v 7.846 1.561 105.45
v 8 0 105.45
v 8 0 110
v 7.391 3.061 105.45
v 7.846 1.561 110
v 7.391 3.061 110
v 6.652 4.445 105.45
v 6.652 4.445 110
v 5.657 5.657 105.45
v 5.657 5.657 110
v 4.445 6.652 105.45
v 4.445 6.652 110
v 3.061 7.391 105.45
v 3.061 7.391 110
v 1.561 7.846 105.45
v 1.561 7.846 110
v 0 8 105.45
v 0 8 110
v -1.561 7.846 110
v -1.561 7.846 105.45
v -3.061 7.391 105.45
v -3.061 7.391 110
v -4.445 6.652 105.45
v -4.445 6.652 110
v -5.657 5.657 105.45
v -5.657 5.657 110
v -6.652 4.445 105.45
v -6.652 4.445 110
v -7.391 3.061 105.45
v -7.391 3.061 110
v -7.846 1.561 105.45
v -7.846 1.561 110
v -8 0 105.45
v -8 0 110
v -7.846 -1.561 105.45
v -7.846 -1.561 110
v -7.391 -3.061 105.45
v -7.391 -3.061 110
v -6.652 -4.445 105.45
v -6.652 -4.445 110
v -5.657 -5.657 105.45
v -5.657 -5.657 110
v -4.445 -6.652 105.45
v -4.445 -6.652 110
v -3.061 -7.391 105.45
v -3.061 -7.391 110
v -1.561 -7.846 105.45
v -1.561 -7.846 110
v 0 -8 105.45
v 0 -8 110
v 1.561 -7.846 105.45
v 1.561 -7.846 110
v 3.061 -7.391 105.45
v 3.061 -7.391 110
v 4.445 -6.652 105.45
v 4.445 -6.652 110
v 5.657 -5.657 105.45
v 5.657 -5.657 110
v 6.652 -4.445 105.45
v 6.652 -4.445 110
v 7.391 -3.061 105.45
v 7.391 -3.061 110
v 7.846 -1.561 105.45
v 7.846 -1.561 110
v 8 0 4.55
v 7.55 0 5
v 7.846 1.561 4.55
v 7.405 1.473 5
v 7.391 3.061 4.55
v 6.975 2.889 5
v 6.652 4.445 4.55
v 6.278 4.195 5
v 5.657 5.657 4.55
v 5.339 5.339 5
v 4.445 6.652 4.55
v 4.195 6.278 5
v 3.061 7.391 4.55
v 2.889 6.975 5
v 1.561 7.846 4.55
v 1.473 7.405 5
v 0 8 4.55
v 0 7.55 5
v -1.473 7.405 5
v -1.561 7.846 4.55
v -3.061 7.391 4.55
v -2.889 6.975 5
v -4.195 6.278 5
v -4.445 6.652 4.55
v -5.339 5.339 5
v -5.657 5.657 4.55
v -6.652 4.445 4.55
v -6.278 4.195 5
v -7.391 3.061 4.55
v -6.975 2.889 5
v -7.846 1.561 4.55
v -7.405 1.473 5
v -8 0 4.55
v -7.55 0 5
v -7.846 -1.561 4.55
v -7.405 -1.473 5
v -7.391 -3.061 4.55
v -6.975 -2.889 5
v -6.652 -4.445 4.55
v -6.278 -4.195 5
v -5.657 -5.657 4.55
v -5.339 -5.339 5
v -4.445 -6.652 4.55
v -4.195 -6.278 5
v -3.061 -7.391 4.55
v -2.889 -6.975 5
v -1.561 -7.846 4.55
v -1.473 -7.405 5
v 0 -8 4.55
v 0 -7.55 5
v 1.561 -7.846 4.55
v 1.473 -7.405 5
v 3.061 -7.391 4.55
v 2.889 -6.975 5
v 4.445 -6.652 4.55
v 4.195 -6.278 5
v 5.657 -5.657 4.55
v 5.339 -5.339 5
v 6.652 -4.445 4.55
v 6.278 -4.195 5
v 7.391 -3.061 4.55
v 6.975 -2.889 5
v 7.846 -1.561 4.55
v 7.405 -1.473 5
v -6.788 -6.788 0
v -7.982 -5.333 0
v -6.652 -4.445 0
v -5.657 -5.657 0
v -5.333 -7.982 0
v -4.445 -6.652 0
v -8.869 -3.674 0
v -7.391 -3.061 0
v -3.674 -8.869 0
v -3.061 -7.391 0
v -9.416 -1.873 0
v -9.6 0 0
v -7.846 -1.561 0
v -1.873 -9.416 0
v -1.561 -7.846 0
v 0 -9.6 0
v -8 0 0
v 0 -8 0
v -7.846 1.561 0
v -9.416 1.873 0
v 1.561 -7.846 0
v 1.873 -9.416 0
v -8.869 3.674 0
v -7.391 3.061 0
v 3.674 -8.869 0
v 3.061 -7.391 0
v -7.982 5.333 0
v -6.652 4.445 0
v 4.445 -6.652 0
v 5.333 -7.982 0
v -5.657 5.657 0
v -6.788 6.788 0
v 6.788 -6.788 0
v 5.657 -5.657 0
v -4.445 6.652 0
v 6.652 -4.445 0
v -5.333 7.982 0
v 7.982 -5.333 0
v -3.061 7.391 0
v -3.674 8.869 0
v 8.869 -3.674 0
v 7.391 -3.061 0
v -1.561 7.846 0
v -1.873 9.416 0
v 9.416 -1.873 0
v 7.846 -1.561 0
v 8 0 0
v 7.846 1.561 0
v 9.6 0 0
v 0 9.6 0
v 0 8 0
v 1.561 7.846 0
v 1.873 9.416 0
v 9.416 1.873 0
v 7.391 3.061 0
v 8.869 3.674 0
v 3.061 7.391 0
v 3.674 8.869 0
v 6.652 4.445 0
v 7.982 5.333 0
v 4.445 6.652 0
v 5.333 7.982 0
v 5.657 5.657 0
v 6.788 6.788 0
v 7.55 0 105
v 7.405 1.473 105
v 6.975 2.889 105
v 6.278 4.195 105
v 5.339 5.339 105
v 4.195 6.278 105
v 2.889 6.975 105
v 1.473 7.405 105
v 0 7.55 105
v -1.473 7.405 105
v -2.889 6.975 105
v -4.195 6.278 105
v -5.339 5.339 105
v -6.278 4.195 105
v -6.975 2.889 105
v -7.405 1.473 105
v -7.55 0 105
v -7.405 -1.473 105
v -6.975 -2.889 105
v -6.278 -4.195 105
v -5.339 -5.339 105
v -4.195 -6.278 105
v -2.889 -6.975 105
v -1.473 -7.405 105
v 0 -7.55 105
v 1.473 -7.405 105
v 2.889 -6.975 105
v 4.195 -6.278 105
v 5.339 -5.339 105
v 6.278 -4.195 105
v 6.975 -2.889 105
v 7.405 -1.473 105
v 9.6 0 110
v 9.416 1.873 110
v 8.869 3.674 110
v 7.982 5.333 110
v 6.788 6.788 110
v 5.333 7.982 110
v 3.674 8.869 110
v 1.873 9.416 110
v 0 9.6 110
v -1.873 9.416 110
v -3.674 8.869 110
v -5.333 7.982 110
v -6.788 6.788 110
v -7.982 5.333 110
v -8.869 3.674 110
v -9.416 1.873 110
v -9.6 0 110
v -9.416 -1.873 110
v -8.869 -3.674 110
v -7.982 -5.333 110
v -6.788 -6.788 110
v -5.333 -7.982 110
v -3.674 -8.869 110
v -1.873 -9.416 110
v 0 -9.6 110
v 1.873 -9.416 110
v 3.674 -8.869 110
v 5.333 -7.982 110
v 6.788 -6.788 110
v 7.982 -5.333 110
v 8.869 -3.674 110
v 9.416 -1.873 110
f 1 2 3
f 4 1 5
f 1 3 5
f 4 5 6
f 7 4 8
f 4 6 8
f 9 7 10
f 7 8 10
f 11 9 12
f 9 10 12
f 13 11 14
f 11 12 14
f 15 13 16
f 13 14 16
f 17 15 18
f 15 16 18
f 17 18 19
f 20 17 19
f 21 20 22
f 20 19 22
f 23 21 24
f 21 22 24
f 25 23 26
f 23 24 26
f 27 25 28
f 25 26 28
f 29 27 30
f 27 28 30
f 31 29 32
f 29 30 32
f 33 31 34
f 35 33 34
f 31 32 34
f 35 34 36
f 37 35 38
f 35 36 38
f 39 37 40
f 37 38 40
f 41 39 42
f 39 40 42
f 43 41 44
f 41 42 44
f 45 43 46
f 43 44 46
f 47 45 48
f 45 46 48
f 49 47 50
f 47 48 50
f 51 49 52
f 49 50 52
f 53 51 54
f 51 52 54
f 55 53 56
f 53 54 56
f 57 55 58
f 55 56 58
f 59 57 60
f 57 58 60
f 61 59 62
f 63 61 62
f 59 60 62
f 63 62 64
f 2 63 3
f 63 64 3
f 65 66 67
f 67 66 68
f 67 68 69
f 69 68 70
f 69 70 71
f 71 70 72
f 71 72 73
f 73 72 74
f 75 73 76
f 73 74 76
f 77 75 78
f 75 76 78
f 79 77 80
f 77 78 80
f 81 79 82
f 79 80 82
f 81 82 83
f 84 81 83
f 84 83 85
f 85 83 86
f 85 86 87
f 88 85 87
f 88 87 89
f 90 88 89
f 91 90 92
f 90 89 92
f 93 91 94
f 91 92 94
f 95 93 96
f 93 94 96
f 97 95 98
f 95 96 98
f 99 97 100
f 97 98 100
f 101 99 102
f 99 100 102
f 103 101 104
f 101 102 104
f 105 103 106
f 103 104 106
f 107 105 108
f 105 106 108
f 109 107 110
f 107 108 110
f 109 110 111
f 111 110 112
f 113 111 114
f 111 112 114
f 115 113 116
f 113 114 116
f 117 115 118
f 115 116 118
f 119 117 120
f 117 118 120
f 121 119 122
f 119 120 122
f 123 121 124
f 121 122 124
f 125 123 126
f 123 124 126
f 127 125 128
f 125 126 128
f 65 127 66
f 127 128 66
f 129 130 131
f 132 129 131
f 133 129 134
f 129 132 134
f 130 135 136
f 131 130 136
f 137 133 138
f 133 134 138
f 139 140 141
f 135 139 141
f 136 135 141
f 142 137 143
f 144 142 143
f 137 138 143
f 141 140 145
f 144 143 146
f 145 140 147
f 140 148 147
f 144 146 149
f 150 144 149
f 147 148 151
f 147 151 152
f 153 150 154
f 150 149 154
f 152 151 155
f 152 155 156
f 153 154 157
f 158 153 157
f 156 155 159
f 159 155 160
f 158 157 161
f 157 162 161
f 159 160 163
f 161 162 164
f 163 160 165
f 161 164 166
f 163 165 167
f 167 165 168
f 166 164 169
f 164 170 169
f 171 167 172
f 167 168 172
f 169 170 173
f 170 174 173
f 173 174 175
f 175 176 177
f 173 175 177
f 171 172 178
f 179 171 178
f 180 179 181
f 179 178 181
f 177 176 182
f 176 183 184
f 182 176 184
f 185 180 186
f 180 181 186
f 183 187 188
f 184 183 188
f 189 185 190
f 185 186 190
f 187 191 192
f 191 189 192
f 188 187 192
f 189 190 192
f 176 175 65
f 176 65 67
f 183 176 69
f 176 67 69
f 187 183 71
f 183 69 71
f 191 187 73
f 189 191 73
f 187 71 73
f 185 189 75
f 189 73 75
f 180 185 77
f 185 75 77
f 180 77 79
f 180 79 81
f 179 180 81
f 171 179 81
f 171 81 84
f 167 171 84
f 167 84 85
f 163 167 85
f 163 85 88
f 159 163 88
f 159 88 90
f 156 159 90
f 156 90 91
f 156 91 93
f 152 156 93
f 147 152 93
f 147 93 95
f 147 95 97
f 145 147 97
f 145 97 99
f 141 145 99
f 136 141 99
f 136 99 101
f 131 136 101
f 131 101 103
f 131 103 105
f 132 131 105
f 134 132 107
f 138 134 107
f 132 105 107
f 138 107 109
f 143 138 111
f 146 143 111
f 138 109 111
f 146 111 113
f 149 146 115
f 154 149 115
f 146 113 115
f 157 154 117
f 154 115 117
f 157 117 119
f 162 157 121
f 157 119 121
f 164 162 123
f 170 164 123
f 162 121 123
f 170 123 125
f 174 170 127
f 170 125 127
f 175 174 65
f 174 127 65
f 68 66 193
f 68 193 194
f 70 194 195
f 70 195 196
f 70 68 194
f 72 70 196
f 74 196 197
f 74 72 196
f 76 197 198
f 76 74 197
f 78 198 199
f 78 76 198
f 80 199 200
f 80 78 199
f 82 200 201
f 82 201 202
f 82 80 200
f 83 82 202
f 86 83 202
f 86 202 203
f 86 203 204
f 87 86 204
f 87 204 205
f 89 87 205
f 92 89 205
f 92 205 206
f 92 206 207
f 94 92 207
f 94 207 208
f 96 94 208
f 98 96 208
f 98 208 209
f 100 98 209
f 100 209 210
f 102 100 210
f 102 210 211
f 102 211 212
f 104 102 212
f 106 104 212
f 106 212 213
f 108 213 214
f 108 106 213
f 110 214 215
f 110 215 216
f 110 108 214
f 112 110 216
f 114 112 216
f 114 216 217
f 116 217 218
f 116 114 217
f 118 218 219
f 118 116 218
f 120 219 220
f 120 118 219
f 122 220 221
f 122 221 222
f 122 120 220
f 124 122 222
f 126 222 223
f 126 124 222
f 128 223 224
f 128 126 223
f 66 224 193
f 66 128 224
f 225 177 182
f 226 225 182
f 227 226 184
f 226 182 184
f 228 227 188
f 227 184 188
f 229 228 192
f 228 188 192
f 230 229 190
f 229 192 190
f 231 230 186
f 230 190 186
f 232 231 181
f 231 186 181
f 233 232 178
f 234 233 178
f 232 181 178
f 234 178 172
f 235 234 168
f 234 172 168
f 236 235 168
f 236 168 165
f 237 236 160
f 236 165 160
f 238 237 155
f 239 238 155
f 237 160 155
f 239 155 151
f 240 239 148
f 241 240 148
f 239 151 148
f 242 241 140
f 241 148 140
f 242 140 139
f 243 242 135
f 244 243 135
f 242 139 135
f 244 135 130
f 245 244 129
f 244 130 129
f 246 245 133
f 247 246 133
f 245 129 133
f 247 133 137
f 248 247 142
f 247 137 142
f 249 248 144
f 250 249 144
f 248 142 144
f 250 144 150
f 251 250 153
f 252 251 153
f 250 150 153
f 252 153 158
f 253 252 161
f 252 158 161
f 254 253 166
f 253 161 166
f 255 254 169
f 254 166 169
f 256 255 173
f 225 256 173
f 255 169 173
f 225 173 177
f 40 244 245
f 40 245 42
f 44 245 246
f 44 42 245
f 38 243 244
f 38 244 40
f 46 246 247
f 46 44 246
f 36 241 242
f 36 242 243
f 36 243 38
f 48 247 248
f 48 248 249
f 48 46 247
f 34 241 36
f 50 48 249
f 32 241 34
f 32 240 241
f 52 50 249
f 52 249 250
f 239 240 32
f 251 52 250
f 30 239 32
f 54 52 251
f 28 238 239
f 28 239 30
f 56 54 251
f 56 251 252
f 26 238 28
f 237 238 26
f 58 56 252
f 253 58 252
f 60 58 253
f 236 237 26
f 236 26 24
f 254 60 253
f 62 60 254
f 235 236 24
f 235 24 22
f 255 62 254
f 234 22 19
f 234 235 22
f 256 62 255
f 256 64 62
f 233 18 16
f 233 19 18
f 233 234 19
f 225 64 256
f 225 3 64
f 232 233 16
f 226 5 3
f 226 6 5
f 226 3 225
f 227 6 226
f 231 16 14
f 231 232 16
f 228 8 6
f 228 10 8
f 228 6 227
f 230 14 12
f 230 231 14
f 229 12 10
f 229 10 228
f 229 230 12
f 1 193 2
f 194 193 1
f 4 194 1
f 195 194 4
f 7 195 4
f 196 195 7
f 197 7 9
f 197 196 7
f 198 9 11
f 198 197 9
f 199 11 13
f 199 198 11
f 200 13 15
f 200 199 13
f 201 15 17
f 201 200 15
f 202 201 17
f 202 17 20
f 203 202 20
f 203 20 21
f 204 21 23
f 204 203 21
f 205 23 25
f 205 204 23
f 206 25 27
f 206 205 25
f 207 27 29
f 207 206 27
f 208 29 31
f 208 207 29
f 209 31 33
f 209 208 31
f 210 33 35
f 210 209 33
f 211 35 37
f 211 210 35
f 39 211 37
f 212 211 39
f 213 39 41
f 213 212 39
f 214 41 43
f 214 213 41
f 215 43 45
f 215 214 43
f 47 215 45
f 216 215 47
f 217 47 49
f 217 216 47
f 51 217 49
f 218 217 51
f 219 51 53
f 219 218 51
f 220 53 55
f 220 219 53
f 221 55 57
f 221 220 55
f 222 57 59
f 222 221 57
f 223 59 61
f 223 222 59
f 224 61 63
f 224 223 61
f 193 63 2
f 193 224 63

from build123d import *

# Parameters (mm, degrees)
F0_R         = 9.6
F0_R_2       = 8
F1_DEPTH     = 110
F0_R_3       = 7.55
F2_DEPTH     = 106
F3_DEPTH     = 4
F4_S5_R      = 8
F4_T6_DEPTH  = 14
F4_S11_R     = 8
F4_T12_DEPTH = 14


# Not quite as in the source:
# - a fillet or chamfer that OpenCascade refuses, or shapes differently, is made with other operations: its cross-section is extruded or revolved along the edge and cut away or added


with BuildPart() as f1:
    # F0 (on Top) → F1 (new body)
    with BuildSketch(Plane.XY):
        Circle(F0_R)
        Circle(F0_R_2, mode=Mode.SUBTRACT)
    extrude(amount=F1_DEPTH)

    # F0 (on Top) → F2 (join)
    with BuildSketch(Plane.XY):
        Circle(F0_R_2)
        Circle(F0_R_3, mode=Mode.SUBTRACT)
    extrude(amount=F2_DEPTH)

    # F0 (on Top) → F3 (cut)
    with BuildSketch(Plane.XY):
        Circle(F0_R_2)
        Circle(F0_R_3, mode=Mode.SUBTRACT)
    extrude(amount=F3_DEPTH, mode=Mode.SUBTRACT)

    # F4: chamfer of 1 on 2 edges, made by hand


with BuildPart() as f4_tool2:
    # F4_s3 → F4_t4 (revolve)
    with BuildSketch(Plane.XZ):
        Polygon((8.55, 4), (7.55, 5), (7.55, 4), align=None)
    revolve(axis=Axis((0, 0, 4), (0, 0, 1)))

    # F4_s5 → F4_t6 (intersect, symmetric)
    with BuildSketch(Plane.XY.offset(4.5)):
        Circle(F4_S5_R)
    extrude(amount=F4_T6_DEPTH, both=True, mode=Mode.INTERSECT)


with BuildPart() as f1_1:
    add(f1.part)

    # F4_t1: cut F4_tool2
    add(f4_tool2.part, mode=Mode.SUBTRACT)


with BuildPart() as f4_tool8:
    # F4_s9 → F4_t10 (revolve)
    with BuildSketch(Plane.XZ):
        Polygon((8.55, 106), (7.55, 105), (7.55, 106), align=None)
    revolve(axis=Axis((0, 0, 106), (0, 0, 1)))

    # F4_s11 → F4_t12 (intersect, symmetric)
    with BuildSketch(Plane.XY.offset(105.5)):
        Circle(F4_S11_R)
    extrude(amount=F4_T12_DEPTH, both=True, mode=Mode.INTERSECT)


with BuildPart() as f1_2:
    add(f1_1.part)

    # F4_t7: cut F4_tool8
    add(f4_tool8.part, mode=Mode.SUBTRACT)


solid = f1_2.part
